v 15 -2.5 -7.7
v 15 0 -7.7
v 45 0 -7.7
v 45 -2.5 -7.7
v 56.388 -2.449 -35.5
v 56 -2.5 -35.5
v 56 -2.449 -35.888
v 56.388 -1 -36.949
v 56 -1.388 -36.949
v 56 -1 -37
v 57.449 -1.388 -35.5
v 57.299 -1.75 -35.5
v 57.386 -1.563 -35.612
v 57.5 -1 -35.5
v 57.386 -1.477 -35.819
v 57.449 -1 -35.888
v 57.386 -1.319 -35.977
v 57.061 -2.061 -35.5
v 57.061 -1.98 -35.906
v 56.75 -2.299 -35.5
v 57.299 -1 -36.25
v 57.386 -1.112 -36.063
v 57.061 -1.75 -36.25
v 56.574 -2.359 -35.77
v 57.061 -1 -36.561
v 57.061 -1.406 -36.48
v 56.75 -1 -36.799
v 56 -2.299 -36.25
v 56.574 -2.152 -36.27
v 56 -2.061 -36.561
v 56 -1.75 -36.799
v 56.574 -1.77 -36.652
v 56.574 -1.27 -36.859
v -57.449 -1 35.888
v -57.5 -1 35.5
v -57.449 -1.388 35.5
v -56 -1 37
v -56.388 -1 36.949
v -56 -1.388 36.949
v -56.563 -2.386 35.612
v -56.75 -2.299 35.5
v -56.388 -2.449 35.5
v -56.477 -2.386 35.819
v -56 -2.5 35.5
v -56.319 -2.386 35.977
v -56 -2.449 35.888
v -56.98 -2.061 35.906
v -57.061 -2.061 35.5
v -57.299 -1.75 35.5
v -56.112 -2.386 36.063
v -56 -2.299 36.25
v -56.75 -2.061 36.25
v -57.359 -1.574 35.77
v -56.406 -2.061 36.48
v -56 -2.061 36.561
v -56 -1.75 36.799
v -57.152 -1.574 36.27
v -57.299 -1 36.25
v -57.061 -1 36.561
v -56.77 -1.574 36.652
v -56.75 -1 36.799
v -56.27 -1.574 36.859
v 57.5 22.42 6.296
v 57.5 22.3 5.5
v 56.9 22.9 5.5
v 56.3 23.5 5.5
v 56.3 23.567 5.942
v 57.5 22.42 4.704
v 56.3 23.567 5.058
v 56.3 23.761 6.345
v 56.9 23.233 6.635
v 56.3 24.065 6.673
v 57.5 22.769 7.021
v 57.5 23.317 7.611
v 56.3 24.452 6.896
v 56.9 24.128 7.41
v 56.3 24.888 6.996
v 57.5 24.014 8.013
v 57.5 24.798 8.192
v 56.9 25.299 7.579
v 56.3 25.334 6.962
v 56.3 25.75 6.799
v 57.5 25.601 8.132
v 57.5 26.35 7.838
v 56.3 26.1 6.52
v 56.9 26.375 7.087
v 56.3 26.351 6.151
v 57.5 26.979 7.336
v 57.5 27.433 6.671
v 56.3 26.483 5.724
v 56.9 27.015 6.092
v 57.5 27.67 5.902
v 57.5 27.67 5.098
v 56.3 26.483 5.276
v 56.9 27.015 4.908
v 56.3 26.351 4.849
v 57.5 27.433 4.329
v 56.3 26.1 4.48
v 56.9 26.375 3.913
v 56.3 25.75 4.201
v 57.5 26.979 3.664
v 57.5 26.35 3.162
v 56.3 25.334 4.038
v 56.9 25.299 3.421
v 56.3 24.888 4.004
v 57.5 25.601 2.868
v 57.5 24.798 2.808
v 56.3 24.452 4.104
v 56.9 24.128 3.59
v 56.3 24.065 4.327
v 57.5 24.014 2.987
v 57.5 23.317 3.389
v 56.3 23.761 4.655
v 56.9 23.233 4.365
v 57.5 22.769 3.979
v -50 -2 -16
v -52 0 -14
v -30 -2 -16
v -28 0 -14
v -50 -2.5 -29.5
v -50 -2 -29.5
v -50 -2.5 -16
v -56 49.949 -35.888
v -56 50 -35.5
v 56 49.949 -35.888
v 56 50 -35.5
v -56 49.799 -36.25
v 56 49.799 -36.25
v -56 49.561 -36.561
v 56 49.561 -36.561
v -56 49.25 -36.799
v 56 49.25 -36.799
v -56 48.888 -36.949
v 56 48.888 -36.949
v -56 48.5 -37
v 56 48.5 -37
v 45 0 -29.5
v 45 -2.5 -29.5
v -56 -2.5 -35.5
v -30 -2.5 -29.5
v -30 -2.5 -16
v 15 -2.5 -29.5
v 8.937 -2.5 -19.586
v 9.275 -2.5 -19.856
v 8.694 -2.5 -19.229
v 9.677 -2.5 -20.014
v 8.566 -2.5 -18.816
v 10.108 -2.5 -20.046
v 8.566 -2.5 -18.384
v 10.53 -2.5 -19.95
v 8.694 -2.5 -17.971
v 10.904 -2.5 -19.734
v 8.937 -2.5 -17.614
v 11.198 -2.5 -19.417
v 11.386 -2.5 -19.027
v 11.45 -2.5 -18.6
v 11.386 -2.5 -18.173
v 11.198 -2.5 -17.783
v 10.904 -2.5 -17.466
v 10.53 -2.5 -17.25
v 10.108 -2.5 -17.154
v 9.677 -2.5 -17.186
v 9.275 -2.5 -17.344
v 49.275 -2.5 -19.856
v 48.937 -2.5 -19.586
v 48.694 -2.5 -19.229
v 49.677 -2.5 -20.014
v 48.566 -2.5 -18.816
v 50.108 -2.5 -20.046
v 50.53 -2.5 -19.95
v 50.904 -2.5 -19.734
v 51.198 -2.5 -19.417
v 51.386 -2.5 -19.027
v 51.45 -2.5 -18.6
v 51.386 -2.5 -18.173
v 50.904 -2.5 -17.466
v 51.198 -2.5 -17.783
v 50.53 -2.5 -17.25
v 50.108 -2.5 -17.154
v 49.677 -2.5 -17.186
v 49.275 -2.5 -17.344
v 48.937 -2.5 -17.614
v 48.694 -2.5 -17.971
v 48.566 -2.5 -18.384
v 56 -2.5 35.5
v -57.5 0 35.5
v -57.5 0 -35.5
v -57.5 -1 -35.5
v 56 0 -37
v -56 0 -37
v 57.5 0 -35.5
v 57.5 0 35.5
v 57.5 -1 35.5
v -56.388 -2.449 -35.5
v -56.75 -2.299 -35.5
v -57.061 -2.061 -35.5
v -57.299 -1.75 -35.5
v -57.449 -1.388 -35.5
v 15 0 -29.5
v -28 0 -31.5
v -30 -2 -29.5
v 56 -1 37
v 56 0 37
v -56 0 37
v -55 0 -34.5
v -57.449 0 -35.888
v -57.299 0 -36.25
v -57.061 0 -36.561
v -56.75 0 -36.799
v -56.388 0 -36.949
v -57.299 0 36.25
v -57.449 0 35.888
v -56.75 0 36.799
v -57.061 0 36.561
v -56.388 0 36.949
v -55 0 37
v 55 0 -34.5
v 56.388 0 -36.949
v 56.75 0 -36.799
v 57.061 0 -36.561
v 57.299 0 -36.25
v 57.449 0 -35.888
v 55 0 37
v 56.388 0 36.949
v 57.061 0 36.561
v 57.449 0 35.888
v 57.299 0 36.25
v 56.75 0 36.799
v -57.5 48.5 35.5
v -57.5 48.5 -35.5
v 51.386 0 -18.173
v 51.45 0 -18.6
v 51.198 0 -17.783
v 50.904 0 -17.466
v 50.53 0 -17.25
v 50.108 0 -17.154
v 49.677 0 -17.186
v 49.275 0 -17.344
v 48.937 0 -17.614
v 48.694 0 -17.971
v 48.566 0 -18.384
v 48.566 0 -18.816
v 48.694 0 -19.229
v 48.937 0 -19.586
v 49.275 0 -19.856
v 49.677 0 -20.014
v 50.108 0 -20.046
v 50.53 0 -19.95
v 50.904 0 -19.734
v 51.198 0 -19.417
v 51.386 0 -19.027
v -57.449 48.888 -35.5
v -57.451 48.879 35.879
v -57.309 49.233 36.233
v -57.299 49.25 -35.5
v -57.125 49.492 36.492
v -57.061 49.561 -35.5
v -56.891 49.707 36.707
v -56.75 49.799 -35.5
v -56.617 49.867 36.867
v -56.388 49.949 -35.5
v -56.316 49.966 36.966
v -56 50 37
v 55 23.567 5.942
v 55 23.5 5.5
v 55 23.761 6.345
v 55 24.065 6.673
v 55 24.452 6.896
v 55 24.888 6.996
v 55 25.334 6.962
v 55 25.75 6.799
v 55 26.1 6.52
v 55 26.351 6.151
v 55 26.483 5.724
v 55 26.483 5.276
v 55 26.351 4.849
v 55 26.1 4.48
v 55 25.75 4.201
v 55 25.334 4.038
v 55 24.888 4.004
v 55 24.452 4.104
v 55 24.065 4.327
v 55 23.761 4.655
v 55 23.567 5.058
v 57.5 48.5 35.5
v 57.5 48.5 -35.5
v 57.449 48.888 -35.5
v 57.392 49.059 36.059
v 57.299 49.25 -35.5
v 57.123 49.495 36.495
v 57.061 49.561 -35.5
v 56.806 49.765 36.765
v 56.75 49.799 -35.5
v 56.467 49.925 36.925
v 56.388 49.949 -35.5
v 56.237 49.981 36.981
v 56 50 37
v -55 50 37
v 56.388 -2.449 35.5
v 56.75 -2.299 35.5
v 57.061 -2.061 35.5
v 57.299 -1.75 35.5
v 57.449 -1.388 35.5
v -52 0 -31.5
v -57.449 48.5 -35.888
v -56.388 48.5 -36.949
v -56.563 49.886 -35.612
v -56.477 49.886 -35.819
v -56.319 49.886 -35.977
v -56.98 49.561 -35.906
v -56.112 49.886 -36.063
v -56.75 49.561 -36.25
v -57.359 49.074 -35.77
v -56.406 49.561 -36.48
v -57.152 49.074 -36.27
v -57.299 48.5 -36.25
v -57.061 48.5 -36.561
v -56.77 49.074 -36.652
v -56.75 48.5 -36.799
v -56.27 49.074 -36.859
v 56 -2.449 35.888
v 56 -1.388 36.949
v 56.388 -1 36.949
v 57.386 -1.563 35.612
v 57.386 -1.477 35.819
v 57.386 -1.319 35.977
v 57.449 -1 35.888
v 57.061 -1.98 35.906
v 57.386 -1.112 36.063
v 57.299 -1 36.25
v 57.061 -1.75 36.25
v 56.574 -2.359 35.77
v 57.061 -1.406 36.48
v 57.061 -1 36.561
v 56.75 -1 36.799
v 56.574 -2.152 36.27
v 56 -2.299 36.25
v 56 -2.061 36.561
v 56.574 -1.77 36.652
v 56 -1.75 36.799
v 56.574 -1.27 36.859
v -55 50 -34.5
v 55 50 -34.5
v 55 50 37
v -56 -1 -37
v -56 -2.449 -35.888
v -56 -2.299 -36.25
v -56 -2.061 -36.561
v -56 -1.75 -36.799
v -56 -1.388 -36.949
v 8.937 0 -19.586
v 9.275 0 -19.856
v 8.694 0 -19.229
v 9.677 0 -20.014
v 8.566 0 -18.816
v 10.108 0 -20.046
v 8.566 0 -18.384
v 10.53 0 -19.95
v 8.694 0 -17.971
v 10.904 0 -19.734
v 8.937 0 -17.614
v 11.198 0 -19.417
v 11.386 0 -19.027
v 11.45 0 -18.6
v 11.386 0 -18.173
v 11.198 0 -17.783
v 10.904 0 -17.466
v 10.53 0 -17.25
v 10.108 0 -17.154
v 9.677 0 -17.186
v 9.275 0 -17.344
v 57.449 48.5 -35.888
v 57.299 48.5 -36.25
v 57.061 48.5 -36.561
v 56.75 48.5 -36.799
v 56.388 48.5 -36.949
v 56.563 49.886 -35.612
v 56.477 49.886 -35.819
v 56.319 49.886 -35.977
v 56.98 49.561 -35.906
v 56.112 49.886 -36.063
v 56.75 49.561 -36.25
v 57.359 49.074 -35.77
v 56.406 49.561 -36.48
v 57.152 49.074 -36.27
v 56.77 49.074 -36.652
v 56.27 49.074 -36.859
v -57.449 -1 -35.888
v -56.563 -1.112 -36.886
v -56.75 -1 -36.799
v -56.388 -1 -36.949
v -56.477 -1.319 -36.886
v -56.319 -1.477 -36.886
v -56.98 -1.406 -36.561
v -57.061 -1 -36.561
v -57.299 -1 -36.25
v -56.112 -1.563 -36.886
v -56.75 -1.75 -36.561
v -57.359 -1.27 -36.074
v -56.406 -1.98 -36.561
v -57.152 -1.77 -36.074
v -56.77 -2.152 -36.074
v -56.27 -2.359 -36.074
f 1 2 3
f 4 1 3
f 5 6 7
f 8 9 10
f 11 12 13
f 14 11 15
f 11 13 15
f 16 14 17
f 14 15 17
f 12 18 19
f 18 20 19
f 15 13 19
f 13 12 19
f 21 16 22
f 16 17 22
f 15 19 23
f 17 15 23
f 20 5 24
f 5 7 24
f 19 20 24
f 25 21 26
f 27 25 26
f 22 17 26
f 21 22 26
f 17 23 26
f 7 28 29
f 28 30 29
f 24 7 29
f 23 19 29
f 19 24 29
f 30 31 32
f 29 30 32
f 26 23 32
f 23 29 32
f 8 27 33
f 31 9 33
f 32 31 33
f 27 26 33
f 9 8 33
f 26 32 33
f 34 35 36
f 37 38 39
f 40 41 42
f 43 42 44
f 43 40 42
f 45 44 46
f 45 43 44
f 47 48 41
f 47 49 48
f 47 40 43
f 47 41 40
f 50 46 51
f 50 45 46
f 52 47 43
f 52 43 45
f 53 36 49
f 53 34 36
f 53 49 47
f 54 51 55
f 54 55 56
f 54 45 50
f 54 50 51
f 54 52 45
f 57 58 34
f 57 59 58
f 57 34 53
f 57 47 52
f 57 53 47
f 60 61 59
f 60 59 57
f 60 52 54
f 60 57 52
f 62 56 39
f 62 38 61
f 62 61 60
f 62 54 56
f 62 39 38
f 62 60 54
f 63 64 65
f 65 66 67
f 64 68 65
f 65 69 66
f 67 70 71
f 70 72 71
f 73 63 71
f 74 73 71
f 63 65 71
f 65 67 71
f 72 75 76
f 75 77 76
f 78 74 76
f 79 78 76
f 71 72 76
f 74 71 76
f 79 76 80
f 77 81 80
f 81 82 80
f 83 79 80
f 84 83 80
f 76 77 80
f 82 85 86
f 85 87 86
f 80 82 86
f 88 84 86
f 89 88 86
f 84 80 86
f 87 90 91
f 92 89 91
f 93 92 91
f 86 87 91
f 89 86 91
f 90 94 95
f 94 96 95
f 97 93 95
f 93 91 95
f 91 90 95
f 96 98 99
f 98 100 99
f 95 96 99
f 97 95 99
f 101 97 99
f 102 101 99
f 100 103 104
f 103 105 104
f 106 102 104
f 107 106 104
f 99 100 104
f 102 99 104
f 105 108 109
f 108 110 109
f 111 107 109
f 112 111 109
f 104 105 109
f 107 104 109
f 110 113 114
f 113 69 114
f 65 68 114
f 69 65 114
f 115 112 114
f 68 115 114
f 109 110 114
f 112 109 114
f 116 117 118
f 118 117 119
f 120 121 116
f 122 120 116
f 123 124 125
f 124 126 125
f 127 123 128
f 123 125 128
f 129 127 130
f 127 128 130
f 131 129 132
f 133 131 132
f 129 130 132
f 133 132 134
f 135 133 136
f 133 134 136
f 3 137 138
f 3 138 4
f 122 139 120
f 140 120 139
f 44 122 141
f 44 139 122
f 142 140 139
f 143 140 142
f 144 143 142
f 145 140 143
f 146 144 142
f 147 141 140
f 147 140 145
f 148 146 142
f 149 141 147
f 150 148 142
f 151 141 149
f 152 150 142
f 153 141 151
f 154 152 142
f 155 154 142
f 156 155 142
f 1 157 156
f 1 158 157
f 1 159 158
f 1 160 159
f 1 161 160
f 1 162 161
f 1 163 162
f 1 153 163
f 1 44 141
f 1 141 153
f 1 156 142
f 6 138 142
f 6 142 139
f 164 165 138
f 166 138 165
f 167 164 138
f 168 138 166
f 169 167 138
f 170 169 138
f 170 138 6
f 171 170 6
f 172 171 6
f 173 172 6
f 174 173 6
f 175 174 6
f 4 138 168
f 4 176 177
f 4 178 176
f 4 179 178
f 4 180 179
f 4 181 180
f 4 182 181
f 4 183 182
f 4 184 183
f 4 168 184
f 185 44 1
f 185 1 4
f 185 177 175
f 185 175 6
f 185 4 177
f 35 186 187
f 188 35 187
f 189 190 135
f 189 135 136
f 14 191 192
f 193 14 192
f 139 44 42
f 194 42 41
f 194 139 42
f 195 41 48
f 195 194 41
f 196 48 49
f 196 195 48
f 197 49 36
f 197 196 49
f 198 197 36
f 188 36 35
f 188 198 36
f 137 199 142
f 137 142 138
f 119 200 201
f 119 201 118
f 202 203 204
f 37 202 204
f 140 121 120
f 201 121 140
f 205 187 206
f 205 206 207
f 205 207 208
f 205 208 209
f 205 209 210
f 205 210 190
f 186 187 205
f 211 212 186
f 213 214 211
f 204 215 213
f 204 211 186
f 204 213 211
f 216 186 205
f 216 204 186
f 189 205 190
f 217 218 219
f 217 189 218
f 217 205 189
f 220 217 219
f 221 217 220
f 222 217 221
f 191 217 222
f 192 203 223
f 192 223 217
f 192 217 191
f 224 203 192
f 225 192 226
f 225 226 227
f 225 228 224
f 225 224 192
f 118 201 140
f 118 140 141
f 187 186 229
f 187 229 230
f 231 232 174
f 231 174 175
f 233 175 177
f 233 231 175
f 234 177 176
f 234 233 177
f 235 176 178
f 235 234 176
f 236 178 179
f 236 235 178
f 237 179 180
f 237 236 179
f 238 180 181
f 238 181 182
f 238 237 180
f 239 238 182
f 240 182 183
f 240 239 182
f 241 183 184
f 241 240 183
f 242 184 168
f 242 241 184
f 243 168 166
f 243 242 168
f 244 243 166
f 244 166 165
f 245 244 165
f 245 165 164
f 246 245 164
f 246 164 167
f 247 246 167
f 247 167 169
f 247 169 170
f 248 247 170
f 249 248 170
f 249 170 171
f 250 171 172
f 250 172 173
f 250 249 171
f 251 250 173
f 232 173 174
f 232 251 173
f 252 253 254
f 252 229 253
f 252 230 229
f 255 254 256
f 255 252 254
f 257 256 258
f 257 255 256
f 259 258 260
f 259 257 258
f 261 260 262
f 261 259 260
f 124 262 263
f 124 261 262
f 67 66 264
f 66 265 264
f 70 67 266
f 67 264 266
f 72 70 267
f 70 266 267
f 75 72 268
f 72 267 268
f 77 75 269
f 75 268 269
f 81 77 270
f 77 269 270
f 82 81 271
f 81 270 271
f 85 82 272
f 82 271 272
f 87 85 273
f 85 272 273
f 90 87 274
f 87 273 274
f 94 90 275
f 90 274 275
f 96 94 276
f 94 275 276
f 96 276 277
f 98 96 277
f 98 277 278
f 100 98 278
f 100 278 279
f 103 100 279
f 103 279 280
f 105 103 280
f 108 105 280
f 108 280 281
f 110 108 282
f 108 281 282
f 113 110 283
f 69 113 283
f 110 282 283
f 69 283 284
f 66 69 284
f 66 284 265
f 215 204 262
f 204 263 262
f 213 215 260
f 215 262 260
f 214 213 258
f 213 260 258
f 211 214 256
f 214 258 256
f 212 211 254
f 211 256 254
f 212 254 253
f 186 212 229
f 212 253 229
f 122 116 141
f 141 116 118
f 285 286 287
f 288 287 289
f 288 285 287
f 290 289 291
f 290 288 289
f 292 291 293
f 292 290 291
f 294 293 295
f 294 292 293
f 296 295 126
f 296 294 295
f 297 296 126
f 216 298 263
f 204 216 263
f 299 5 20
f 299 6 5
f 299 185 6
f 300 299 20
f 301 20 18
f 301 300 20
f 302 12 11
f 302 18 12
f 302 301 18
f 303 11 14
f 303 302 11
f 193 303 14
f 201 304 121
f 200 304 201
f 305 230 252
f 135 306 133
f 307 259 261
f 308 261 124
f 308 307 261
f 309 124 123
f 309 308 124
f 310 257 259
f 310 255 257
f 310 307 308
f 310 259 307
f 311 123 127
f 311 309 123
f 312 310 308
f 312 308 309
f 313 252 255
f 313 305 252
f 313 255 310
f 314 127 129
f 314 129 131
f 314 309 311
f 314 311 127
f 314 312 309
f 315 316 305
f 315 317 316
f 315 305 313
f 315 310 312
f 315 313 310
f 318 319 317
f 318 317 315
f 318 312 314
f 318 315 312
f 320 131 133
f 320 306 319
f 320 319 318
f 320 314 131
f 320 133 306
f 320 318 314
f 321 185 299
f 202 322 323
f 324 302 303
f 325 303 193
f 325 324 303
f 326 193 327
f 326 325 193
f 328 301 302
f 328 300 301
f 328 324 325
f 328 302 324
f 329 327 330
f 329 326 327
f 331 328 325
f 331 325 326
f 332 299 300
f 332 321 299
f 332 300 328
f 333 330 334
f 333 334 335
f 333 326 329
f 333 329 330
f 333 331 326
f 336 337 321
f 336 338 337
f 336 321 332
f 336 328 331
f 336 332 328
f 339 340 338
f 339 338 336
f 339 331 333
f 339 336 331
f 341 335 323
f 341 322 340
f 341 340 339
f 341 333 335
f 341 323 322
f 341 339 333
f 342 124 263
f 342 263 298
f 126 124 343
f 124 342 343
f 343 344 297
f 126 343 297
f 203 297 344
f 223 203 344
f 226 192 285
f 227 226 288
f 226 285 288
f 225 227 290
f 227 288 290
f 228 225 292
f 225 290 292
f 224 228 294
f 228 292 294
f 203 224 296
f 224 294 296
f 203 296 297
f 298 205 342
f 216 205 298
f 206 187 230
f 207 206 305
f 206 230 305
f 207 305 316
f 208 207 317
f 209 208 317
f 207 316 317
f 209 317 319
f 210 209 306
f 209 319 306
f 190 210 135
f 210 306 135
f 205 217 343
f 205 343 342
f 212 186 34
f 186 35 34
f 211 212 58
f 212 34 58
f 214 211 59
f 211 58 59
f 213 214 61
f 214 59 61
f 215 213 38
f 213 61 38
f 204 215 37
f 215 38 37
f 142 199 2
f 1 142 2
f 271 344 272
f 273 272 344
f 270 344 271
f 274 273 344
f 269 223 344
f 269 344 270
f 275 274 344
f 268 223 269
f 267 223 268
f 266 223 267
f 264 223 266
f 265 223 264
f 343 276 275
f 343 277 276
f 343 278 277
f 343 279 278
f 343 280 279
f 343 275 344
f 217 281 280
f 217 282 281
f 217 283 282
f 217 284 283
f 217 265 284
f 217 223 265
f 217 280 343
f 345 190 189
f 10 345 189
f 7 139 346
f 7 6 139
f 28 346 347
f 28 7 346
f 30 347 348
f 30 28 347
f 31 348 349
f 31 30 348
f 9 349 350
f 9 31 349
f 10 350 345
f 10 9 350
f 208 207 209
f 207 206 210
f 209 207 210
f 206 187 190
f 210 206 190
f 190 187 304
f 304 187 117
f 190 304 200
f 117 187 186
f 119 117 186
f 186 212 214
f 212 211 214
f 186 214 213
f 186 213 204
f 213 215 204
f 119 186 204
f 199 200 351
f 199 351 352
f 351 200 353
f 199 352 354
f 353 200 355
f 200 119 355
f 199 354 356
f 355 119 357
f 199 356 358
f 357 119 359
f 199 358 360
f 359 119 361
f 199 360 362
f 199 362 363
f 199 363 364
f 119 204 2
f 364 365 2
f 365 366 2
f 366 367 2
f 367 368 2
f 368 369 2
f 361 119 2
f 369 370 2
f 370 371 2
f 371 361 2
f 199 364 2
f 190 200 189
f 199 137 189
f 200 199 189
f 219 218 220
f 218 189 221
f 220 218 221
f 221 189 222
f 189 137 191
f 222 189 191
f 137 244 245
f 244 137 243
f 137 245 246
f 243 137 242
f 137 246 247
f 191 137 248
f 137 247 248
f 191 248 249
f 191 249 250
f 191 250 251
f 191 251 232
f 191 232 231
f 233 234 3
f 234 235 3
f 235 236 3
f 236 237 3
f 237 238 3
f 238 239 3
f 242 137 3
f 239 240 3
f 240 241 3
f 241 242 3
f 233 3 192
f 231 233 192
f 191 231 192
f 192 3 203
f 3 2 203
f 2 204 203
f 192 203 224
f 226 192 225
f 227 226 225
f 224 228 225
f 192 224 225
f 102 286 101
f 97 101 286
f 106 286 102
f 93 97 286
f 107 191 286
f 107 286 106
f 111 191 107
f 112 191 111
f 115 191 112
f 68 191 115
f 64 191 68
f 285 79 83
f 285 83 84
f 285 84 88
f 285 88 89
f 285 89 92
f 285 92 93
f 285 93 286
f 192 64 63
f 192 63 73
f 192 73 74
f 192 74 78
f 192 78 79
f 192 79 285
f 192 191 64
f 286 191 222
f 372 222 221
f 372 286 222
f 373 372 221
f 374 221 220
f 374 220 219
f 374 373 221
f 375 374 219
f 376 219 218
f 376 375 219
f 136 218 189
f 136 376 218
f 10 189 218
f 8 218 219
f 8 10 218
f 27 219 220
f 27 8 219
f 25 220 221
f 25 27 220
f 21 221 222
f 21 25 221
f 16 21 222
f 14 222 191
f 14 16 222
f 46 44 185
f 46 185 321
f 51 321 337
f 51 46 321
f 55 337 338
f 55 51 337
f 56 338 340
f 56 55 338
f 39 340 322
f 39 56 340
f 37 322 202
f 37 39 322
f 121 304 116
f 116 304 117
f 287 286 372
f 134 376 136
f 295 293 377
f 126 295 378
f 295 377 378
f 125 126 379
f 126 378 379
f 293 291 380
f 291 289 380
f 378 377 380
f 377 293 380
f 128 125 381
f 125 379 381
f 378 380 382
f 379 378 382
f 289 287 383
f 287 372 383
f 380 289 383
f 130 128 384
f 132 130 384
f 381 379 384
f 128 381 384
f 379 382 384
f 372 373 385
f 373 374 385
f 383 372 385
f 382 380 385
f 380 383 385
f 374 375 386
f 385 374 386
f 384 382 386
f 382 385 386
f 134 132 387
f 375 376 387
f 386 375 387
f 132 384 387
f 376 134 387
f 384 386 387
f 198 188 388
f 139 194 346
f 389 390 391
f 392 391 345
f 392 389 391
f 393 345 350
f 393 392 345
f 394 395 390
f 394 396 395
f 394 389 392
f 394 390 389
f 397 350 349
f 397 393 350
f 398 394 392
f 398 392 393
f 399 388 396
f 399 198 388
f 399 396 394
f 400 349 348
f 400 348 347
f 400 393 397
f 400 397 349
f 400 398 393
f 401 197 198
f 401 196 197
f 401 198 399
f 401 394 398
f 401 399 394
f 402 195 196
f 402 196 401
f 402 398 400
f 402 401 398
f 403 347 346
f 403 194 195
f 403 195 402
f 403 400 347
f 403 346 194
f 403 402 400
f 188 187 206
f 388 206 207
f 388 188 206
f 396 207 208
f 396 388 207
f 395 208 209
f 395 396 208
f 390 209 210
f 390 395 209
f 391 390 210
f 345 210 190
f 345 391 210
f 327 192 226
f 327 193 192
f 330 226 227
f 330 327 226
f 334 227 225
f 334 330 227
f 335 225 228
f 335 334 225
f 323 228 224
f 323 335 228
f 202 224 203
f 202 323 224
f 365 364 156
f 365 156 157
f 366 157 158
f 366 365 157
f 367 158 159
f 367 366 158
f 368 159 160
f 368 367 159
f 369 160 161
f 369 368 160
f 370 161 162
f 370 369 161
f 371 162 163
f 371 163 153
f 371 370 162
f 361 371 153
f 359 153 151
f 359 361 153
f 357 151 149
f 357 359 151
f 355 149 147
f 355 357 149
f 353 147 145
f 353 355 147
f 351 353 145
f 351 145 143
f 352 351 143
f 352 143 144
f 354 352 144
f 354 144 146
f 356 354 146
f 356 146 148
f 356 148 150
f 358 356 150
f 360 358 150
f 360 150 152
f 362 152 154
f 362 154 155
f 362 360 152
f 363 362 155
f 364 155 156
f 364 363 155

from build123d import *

# Parameters (mm, degrees)
F0_W           = 110
F0_H           = 69
F0_W_2         = 20
F0_H_2         = 13.5
F0_R           = 1.45
F0_W_3         = 30
F0_H_3         = 21.8
F0_H_4         = 2.5
F1_DEPTH       = 2.5
F2_DEPTH       = 50
F4_D           = 3
F4_DEPTH       = 12
F4_CSINK_D     = 5.4
F4_CSINK_ANGLE = 90
F5_SIZE        = 2
F6_R           = 1.5
F6_2_R         = 1.5


with BuildPart() as f1:
    # F0 (on Front) → F1 (new body)
    with BuildSketch(Plane.XZ):
        Rectangle(F0_W, F0_H)
        with Locations((-40, -22.75)):
            Rectangle(F0_W_2, F0_H_2, mode=Mode.SUBTRACT)
        with Locations((10, -18.6)):
            Circle(F0_R, mode=Mode.SUBTRACT)
        with Locations((30, -18.6)):
            Rectangle(F0_W_3, F0_H_3, mode=Mode.SUBTRACT)
        with Locations((50, -18.6)):
            Circle(F0_R, mode=Mode.SUBTRACT)
        Polygon((57.5, -37), (57.5, 37), (55, 37), (55, 34.5), (55, -34.5), (-55, -34.5), (-55, 34.5), (-55, 37), (-57.5, 37), (-57.5, -37), align=None)
        with Locations((0, 35.75)):
            Rectangle(F0_W, F0_H_4)
    extrude(amount=F1_DEPTH)

    # F5
    f5_edges = [f1.edges().sort_by_distance(p)[0] for p in [
        (-30, 0, -22.75),
        (-40, 0, -16),
        (-40, 0, -29.5),
        (-50, 0, -22.75),
    ]]
    chamfer(f5_edges, length=F5_SIZE)

    # F6#2
    f6_2_edges = [f1.edges().sort_by_distance(p)[0] for p in [
        (-57.5, -1.25, 37),
        (-57.5, -2.5, 0),
        (0, -2.5, 37),
        (-57.5, -1.25, -37),
        (0, -2.5, -37),
        (57.5, -2.5, 0),
        (57.5, -1.25, 37),
        (57.5, -1.25, -37),
    ]]
    fillet(f6_2_edges, radius=F6_2_R)


with BuildPart() as f2:
    # F0 (on Front) → F2 (new body)
    with BuildSketch(Plane.XZ):
        Polygon((57.5, -37), (57.5, 37), (55, 37), (55, 34.5), (55, -34.5), (-55, -34.5), (-55, 34.5), (-55, 37), (-57.5, 37), (-57.5, -37), align=None)
    extrude(amount=-F2_DEPTH)

    # F4
    with Locations(Plane.YZ.offset(57.5)):
        with Locations((25, 5.5)):
            CounterSinkHole(F4_D / 2, F4_CSINK_D / 2, depth=F4_DEPTH, counter_sink_angle=F4_CSINK_ANGLE)

    # F6
    f6_edges = [f2.edges().sort_by_distance(p)[0] for p in [
        (-57.5, 25, 37),
        (-57.5, 25, -37),
        (57.5, 25, 37),
        (57.5, 25, -37),
        (57.5, 50, 0),
        (-57.5, 50, 0),
        (0, 50, -37),
    ]]
    fillet(f6_edges, radius=F6_R)


solid = Compound([f1.part, f2.part])
